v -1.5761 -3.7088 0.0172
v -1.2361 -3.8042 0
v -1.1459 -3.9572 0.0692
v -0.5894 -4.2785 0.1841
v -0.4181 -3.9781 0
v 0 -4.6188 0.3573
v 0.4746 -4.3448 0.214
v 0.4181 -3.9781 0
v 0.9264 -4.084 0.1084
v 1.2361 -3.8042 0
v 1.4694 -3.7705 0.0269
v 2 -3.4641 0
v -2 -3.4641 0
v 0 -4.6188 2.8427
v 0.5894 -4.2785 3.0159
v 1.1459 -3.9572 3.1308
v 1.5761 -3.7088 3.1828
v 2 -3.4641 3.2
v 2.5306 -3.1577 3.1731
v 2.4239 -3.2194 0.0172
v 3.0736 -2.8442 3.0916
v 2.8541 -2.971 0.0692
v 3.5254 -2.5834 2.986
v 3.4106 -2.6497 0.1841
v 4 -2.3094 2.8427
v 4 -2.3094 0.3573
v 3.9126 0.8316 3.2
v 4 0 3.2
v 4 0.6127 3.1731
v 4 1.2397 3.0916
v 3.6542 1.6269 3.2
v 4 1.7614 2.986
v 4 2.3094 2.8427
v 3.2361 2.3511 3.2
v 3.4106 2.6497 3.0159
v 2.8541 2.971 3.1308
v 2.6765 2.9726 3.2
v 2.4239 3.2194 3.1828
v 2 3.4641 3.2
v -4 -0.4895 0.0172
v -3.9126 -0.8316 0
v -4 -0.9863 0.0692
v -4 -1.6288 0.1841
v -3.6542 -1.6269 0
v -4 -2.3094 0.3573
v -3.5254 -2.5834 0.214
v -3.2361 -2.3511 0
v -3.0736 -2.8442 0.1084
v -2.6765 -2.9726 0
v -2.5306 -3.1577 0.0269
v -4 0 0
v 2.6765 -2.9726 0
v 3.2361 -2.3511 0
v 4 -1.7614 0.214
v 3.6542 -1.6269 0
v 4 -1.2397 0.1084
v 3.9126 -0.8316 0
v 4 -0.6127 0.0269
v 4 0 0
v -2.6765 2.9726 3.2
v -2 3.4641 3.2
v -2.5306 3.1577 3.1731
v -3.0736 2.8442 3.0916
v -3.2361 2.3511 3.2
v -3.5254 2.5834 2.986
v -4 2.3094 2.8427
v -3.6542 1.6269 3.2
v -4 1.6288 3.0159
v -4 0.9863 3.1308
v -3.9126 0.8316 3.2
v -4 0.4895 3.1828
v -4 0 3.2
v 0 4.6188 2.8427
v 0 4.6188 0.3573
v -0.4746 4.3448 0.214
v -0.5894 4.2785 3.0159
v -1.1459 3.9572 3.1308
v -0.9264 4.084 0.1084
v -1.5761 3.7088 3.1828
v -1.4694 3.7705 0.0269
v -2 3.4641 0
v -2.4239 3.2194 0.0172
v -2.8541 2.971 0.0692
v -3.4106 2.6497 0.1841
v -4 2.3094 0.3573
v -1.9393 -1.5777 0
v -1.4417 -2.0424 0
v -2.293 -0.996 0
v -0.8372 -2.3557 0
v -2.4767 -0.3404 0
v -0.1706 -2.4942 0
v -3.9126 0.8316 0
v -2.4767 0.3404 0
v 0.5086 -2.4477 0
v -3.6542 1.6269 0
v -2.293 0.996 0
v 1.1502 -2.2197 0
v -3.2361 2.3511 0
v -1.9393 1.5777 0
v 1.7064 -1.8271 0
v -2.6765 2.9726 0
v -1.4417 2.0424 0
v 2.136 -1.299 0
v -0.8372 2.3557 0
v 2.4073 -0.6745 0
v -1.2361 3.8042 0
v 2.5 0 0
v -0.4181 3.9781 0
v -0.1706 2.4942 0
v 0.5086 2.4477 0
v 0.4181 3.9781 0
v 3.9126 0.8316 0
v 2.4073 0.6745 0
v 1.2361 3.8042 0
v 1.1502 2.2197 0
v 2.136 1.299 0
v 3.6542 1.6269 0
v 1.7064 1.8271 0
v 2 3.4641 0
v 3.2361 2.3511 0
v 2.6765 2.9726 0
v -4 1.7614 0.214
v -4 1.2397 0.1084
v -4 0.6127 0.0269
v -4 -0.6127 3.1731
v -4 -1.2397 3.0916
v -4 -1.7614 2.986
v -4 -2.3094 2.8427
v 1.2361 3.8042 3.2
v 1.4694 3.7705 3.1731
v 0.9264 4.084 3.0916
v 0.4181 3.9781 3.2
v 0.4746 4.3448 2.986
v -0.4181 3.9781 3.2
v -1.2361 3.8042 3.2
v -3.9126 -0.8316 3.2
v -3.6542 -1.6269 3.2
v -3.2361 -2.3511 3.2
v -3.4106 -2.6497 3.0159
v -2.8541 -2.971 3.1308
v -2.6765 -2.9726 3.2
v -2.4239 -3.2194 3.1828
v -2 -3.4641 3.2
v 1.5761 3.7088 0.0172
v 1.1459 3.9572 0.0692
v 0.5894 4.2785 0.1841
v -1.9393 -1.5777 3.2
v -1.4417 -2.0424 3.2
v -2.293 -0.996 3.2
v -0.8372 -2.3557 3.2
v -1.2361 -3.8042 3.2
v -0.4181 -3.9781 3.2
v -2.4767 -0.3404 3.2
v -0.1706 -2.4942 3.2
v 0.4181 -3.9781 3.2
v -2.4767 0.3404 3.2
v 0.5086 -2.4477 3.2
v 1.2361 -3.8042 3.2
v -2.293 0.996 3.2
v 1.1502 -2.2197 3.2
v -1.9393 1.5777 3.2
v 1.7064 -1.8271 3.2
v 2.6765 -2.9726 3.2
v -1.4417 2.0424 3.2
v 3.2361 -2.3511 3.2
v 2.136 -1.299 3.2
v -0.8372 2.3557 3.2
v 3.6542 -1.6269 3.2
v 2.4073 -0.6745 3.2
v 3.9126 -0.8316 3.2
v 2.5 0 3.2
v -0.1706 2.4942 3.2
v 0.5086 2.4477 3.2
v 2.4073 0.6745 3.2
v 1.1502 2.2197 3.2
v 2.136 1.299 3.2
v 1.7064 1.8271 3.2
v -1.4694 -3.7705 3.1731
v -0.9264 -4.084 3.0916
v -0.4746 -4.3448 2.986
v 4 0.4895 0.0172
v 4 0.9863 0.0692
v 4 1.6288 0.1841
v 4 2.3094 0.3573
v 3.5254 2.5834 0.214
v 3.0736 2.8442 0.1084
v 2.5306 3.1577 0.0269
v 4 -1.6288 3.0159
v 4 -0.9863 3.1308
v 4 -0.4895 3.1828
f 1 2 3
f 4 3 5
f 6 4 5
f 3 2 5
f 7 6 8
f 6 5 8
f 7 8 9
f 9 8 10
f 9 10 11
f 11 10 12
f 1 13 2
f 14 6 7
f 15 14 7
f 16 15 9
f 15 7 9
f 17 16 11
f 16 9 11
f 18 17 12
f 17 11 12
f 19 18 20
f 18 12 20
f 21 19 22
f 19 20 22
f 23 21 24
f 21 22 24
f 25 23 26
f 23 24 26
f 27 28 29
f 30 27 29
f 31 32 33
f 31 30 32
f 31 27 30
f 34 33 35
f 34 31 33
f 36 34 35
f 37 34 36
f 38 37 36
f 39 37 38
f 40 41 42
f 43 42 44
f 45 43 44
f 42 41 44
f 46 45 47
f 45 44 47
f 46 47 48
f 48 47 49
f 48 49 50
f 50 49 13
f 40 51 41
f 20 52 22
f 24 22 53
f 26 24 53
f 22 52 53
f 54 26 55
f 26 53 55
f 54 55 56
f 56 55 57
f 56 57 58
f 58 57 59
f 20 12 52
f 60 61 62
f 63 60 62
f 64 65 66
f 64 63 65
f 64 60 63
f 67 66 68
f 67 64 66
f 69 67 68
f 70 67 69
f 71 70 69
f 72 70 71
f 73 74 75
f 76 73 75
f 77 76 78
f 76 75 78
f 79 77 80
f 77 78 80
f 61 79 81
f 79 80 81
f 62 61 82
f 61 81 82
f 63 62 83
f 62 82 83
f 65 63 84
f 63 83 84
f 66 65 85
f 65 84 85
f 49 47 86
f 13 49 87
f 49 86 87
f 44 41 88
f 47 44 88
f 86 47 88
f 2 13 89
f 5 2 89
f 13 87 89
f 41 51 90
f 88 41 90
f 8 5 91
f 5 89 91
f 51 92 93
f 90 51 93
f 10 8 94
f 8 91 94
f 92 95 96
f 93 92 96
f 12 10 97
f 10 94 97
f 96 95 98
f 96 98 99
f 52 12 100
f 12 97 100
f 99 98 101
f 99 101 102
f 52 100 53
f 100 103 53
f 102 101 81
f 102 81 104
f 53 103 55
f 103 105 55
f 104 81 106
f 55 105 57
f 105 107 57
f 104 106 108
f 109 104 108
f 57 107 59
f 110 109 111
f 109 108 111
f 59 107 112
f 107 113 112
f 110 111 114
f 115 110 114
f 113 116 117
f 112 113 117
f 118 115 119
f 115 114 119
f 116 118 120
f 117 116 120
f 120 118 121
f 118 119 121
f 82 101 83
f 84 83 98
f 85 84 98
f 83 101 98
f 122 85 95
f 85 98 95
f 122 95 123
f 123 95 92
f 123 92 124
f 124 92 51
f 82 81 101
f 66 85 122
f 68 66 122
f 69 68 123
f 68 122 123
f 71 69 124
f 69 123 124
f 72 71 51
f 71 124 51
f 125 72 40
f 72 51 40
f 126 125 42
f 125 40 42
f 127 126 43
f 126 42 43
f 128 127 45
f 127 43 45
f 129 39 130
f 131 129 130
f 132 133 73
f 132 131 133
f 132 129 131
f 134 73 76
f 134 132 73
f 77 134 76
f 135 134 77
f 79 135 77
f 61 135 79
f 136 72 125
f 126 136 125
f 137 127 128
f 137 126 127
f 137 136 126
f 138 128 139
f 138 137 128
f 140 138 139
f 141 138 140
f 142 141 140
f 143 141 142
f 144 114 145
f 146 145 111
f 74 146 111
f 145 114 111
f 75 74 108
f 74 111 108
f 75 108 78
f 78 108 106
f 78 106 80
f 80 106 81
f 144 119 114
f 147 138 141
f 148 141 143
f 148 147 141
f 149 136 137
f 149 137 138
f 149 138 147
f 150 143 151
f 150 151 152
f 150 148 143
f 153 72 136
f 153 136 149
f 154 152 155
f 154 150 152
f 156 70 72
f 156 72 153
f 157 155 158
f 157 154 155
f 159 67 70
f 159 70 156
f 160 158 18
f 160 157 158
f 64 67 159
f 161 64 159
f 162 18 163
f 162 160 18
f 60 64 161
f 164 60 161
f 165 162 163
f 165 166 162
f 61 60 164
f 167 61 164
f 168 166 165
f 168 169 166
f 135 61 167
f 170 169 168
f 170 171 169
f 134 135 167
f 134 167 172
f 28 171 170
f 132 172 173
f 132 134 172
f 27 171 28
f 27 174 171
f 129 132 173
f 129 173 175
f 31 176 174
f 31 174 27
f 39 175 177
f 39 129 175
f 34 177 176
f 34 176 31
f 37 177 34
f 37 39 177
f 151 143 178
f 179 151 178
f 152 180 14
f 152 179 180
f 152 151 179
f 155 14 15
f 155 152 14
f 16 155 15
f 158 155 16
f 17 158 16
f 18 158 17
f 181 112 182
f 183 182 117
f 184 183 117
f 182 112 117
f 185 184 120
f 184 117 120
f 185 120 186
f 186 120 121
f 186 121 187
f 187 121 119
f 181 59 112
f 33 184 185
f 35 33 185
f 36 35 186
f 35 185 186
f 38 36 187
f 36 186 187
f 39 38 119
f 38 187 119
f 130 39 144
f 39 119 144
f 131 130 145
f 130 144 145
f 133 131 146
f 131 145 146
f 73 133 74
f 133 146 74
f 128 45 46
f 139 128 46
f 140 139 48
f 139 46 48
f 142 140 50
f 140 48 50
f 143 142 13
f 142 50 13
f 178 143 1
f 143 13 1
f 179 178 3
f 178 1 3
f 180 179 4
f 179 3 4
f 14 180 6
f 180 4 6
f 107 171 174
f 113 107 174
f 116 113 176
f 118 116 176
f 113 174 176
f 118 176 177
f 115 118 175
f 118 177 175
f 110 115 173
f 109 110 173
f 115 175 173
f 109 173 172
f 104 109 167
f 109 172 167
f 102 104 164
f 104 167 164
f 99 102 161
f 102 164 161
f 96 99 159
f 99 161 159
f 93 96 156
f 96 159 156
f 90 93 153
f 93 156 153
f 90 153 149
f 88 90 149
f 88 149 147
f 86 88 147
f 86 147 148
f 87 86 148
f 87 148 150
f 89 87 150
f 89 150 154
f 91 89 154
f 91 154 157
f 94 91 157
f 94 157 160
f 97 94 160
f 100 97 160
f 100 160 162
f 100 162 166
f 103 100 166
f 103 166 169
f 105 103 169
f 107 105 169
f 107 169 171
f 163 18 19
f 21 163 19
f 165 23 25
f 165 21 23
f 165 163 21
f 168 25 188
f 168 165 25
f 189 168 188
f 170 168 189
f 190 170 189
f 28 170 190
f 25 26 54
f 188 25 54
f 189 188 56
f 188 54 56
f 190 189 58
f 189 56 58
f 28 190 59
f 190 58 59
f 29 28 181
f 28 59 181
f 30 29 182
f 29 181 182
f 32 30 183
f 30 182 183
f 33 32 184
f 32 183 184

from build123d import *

# Parameters (mm, degrees)
EXTRUDE1_DEPTH     = 3.2
SKETCH2_R          = 2.5
CUT_EXTRUDE1_DEPTH = 4.2


with BuildPart() as part:
    # Sketch1 → Extrude1 (new body)
    with BuildSketch(Plane.XY):
        Polygon((0, 4.618802154), (-4, 2.309401077), (-4, -2.309401077), (0, -4.618802154), (4, -2.309401077), (4, 2.309401077), align=None)
    extrude(amount=EXTRUDE1_DEPTH)

    # Sketch2 → Cut-Extrude1 (cut, through all)
    with BuildSketch(Plane.XY.offset(3.2)):
        Circle(SKETCH2_R)
    extrude(amount=-CUT_EXTRUDE1_DEPTH, mode=Mode.SUBTRACT)

    # Sketch3 → Cut-Revolve1 (revolve, cut)
    with BuildSketch(Plane(origin=(0, 0, 0), x_dir=(0, 0, -1), z_dir=(1, 0, 0))):
        Polygon((-3.2, 5.618802154), (-2.265384141, 5.618802154), (-3.2, 4), align=None)
    cut_revolve1 = revolve(axis=Axis((0, 0, 0), (0, 0, 1)), mode=Mode.SUBTRACT)

    # Mirror1: Cut-Revolve1 across plane
    add(cut_revolve1.mirror(Plane.XY.offset(1.6)), mode=Mode.SUBTRACT)


solid = part.part
